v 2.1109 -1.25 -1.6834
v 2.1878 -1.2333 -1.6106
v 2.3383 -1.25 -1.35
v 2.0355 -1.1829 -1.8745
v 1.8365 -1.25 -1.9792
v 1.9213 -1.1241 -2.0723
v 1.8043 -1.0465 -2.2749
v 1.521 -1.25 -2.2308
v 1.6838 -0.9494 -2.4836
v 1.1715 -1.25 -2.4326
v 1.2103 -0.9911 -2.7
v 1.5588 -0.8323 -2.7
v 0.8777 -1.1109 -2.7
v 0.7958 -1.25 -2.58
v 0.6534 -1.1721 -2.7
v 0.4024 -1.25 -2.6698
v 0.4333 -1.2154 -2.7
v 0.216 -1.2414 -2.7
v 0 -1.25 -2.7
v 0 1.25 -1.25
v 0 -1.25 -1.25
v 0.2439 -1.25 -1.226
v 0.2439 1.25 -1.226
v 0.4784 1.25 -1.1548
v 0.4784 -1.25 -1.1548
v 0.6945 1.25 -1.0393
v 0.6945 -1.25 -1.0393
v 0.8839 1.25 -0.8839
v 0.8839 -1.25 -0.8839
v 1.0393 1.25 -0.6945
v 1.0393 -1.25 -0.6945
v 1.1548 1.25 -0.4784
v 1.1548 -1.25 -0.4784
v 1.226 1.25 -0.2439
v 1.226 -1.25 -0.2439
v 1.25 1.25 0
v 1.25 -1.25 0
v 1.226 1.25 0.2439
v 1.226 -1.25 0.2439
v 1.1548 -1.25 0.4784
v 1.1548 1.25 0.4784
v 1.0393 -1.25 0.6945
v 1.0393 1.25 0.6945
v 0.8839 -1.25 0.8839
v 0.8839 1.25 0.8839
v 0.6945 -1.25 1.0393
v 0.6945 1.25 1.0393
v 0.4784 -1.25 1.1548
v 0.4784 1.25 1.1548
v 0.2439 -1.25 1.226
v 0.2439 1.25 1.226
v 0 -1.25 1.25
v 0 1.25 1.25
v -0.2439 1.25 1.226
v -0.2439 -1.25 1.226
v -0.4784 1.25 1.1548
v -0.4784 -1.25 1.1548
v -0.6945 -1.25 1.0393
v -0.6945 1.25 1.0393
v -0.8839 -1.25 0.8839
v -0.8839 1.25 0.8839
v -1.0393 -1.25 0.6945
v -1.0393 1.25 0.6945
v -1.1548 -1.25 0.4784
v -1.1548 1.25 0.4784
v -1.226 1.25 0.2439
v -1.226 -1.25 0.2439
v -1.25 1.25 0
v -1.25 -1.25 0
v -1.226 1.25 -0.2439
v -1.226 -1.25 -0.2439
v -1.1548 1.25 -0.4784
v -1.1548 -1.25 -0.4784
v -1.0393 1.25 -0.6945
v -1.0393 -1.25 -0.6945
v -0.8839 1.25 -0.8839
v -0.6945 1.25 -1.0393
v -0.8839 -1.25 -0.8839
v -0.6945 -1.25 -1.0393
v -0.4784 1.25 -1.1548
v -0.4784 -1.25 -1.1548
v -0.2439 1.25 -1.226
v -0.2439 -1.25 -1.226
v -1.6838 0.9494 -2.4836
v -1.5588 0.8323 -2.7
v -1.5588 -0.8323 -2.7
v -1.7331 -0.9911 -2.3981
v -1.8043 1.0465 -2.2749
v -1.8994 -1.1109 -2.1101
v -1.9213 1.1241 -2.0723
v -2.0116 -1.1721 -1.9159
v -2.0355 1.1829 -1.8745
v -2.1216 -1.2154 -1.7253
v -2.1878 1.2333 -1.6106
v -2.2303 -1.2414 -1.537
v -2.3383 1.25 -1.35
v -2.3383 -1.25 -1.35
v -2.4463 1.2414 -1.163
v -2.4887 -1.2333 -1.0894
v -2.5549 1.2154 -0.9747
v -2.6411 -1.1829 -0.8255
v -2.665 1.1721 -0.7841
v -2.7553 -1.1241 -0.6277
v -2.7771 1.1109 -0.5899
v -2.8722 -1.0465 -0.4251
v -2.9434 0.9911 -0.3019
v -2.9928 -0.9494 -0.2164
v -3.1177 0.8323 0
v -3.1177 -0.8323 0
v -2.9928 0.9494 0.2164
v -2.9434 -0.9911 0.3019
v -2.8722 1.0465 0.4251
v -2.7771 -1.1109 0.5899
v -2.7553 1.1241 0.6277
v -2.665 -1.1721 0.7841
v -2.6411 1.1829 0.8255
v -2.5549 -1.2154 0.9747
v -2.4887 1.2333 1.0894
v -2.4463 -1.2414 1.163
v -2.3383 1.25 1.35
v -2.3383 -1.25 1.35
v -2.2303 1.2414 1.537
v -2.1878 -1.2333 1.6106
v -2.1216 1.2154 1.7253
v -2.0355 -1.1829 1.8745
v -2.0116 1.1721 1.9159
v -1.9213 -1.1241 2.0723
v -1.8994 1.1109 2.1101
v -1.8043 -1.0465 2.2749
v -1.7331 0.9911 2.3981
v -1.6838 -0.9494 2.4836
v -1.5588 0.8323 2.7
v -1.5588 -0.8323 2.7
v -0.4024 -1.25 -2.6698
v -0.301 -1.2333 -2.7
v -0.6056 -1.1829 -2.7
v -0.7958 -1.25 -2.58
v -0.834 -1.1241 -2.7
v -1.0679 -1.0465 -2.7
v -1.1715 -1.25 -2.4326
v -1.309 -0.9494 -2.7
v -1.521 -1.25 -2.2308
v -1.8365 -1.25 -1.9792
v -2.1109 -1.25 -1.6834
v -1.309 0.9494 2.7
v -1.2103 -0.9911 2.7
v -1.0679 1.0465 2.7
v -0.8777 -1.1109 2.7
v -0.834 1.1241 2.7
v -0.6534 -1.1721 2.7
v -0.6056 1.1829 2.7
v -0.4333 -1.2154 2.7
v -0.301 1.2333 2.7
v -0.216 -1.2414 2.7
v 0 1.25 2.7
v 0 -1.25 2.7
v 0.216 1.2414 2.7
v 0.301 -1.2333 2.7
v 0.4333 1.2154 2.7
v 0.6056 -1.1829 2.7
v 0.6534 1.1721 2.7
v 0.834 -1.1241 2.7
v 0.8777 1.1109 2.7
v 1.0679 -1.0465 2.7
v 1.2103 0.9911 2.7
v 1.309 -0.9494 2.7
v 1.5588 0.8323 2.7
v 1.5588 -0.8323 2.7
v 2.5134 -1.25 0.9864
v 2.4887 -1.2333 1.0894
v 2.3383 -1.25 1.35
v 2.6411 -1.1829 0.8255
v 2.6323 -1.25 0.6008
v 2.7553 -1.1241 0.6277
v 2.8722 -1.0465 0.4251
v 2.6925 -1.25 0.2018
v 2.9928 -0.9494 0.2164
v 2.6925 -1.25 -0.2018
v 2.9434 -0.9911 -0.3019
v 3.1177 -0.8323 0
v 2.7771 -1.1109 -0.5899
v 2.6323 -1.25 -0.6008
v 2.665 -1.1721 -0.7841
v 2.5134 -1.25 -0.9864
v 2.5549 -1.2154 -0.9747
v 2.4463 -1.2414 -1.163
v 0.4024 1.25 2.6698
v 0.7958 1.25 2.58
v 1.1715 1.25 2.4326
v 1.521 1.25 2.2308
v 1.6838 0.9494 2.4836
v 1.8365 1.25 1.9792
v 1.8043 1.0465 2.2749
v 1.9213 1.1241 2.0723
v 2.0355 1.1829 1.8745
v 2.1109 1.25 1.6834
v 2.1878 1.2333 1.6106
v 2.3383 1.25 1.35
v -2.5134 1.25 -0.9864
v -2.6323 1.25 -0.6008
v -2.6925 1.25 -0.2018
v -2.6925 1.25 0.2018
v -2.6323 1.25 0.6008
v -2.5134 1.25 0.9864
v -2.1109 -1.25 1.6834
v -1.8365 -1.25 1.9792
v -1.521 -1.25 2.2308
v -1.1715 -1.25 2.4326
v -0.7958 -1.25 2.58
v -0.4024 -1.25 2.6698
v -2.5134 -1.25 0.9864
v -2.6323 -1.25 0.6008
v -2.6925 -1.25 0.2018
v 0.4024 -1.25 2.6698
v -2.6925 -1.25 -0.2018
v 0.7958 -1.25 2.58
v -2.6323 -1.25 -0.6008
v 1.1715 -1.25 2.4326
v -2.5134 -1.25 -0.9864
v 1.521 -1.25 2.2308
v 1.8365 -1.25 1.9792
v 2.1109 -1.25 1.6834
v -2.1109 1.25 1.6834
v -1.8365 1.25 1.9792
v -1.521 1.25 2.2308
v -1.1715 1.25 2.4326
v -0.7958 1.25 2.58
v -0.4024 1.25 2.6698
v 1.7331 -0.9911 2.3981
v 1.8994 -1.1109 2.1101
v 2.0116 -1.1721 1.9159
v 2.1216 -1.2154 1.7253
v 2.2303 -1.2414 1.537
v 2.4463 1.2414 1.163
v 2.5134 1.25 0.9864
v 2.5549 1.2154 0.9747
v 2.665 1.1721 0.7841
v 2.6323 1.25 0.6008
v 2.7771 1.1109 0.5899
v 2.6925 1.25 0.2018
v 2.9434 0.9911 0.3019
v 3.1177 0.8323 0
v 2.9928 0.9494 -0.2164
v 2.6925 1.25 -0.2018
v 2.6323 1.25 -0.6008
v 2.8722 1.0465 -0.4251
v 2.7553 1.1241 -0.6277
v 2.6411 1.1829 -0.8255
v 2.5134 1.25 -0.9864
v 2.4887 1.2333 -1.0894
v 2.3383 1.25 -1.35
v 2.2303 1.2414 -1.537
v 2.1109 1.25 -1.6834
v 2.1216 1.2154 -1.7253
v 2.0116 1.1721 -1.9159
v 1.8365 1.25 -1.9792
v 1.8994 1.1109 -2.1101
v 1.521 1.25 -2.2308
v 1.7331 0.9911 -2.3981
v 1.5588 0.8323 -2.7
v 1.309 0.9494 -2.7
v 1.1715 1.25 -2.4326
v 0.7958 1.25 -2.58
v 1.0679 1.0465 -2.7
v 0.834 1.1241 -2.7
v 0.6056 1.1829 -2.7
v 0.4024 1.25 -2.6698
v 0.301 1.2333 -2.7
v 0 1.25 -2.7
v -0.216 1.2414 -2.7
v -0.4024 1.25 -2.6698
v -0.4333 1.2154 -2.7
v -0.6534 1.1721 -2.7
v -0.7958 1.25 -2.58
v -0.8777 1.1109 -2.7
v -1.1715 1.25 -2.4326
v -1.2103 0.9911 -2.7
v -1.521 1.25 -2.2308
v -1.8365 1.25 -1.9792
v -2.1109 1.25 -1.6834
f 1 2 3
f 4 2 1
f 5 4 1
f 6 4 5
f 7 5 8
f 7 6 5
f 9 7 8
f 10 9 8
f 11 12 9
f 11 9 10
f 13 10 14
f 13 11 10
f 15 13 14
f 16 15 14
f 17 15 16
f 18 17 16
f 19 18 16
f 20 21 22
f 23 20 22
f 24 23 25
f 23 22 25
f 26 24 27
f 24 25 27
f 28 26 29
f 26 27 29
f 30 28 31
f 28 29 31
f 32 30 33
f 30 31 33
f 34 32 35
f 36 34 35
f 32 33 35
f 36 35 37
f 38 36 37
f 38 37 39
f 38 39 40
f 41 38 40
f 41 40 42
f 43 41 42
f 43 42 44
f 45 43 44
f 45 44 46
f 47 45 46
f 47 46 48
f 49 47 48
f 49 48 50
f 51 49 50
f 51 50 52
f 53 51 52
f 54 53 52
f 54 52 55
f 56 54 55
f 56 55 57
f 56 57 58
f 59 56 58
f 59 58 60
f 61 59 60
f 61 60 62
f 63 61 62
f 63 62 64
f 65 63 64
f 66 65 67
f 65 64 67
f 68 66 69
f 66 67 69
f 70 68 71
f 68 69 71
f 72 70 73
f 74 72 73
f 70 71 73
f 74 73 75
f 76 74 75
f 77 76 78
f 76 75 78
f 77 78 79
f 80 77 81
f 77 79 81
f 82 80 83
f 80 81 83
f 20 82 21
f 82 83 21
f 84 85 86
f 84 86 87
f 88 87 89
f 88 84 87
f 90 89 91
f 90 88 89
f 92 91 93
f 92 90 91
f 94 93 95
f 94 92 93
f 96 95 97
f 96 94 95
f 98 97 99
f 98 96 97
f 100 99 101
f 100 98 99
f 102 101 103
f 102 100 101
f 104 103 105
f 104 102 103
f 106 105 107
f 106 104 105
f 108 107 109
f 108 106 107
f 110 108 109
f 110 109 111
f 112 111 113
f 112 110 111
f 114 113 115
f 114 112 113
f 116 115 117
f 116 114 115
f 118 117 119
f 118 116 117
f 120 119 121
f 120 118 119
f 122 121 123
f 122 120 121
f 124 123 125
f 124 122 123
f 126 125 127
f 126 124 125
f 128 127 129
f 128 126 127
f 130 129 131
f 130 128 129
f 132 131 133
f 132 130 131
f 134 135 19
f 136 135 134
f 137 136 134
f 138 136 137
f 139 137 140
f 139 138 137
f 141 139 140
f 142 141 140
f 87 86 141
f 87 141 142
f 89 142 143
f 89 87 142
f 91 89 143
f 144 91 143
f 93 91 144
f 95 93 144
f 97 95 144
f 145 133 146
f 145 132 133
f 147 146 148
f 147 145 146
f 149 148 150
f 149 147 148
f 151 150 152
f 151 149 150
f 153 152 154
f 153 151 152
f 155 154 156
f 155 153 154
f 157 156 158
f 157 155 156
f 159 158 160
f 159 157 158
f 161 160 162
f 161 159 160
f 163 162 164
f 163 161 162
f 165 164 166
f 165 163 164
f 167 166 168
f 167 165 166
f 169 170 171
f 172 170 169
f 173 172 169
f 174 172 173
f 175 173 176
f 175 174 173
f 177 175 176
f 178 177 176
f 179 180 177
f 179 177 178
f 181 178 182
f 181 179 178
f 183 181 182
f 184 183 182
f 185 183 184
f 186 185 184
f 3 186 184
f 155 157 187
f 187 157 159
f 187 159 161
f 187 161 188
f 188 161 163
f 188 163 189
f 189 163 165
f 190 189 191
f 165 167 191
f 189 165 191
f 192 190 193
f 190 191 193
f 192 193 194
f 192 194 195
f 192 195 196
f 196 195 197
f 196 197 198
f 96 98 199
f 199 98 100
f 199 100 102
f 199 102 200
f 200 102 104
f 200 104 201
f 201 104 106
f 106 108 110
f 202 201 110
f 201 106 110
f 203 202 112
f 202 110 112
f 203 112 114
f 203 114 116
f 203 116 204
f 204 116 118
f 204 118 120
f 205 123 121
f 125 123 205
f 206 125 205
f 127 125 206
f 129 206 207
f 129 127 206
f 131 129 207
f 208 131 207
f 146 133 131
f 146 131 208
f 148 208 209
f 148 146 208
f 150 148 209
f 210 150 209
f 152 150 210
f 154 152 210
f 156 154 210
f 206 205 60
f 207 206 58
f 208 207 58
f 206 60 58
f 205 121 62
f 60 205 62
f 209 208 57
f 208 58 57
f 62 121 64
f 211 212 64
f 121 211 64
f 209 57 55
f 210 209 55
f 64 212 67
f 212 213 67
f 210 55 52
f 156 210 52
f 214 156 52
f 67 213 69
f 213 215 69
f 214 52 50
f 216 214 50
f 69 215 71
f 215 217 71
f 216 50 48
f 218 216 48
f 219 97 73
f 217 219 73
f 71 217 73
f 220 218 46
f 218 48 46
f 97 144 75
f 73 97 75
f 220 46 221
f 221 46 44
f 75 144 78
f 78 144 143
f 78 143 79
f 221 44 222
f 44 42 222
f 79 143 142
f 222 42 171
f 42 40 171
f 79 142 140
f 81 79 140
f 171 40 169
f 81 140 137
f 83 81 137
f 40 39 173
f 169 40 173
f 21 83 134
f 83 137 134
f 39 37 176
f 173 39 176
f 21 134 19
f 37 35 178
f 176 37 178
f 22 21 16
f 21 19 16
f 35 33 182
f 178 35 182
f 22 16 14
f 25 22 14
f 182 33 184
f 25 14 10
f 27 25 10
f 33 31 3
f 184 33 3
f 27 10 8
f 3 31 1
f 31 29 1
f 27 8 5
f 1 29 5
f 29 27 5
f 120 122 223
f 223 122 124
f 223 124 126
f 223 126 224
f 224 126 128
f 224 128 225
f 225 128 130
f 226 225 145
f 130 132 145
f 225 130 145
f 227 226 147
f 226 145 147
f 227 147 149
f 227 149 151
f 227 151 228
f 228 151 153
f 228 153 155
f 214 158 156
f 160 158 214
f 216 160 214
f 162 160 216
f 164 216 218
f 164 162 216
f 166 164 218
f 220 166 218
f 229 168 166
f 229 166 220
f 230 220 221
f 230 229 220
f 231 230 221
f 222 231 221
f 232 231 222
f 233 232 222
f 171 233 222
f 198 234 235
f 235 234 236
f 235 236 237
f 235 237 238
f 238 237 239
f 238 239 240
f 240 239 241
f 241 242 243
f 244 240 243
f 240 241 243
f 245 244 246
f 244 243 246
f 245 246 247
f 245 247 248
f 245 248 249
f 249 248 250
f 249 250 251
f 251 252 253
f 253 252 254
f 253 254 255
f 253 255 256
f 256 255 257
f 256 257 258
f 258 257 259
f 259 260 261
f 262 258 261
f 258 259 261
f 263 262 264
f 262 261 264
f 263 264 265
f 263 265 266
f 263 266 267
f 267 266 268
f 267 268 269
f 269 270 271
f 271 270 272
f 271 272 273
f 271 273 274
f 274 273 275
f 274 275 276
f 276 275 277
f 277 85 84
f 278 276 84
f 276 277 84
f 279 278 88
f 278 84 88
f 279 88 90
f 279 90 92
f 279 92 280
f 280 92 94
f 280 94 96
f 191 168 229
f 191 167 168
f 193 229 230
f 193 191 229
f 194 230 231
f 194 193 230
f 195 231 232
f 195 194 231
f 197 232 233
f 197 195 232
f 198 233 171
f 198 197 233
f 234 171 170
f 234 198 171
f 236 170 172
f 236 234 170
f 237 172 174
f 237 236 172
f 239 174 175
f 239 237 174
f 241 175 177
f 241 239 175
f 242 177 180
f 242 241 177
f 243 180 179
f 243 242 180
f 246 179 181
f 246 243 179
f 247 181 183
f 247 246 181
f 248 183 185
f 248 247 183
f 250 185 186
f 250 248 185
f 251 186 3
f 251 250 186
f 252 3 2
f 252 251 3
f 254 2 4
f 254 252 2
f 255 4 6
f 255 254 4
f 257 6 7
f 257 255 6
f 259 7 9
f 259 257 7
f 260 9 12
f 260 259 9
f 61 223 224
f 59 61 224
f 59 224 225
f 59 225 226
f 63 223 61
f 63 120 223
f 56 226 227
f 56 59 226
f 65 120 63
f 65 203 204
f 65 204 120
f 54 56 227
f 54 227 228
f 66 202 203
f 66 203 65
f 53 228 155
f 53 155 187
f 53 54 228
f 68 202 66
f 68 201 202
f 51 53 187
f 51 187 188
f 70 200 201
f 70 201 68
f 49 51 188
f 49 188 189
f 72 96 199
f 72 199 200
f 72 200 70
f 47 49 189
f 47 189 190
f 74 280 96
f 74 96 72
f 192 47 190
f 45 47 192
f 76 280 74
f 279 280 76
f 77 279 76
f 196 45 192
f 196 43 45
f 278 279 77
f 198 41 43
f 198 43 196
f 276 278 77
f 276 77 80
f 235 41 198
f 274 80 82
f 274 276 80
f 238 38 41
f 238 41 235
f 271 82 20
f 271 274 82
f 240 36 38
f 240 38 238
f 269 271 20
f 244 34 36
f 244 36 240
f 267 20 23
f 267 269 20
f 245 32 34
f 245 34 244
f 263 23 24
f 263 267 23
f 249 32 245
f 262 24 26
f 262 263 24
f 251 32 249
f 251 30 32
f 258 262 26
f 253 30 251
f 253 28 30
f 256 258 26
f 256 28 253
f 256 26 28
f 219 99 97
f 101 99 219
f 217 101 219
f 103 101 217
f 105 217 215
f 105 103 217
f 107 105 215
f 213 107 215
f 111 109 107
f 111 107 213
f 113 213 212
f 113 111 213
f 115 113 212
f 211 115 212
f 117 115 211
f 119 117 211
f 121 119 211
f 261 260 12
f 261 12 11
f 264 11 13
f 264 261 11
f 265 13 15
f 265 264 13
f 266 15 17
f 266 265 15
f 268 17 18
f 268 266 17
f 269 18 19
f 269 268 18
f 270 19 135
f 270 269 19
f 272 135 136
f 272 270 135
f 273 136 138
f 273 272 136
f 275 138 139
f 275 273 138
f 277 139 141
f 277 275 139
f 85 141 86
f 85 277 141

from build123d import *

# Parameters (mm, degrees)
BOSS_EXTRUDE1_DEPTH = 1.25
M3_TAPPED_HOLE1_D   = 2.5
SKETCH4_OUTSIDE_W   = 14.96
SKETCH4_OUTSIDE_H   = 14.124
SKETCH4_OUTSIDE_R   = 2.7
CUT_EXTRUDE1_DEPTH  = 2.5
CUT_EXTRUDE1_TAPER  = 45


with BuildPart() as part:
    # Sketch2 → Boss-Extrude1 (new body, symmetric)
    with BuildSketch(Plane(origin=(0, 0, 0), x_dir=(1, 0, 0), z_dir=(0, 1, 0))):
        Polygon((3.117691454, 0), (1.558845727, 2.7), (-1.558845727, 2.7), (-3.117691454, 0), (-1.558845727, -2.7), (1.558845727, -2.7), align=None)
    extrude(amount=BOSS_EXTRUDE1_DEPTH, both=True)

    # M3 Tapped Hole1 (through all)
    with Locations(Plane.ZX.offset(1.25)):
        with Locations((0, 0)):
            Hole(M3_TAPPED_HOLE1_D / 2)

    # Sketch4 outside → Cut-Extrude1 (cut)
    with BuildSketch(Plane.XZ.offset(1.25)):
        Rectangle(SKETCH4_OUTSIDE_W, SKETCH4_OUTSIDE_H)
        Circle(SKETCH4_OUTSIDE_R, mode=Mode.SUBTRACT)
    cut_extrude1 = extrude(amount=-CUT_EXTRUDE1_DEPTH, taper=CUT_EXTRUDE1_TAPER, mode=Mode.SUBTRACT)

    # Mirror1: Cut-Extrude1 across plane
    add(cut_extrude1.mirror(Plane.ZX), mode=Mode.SUBTRACT)


solid = part.part
